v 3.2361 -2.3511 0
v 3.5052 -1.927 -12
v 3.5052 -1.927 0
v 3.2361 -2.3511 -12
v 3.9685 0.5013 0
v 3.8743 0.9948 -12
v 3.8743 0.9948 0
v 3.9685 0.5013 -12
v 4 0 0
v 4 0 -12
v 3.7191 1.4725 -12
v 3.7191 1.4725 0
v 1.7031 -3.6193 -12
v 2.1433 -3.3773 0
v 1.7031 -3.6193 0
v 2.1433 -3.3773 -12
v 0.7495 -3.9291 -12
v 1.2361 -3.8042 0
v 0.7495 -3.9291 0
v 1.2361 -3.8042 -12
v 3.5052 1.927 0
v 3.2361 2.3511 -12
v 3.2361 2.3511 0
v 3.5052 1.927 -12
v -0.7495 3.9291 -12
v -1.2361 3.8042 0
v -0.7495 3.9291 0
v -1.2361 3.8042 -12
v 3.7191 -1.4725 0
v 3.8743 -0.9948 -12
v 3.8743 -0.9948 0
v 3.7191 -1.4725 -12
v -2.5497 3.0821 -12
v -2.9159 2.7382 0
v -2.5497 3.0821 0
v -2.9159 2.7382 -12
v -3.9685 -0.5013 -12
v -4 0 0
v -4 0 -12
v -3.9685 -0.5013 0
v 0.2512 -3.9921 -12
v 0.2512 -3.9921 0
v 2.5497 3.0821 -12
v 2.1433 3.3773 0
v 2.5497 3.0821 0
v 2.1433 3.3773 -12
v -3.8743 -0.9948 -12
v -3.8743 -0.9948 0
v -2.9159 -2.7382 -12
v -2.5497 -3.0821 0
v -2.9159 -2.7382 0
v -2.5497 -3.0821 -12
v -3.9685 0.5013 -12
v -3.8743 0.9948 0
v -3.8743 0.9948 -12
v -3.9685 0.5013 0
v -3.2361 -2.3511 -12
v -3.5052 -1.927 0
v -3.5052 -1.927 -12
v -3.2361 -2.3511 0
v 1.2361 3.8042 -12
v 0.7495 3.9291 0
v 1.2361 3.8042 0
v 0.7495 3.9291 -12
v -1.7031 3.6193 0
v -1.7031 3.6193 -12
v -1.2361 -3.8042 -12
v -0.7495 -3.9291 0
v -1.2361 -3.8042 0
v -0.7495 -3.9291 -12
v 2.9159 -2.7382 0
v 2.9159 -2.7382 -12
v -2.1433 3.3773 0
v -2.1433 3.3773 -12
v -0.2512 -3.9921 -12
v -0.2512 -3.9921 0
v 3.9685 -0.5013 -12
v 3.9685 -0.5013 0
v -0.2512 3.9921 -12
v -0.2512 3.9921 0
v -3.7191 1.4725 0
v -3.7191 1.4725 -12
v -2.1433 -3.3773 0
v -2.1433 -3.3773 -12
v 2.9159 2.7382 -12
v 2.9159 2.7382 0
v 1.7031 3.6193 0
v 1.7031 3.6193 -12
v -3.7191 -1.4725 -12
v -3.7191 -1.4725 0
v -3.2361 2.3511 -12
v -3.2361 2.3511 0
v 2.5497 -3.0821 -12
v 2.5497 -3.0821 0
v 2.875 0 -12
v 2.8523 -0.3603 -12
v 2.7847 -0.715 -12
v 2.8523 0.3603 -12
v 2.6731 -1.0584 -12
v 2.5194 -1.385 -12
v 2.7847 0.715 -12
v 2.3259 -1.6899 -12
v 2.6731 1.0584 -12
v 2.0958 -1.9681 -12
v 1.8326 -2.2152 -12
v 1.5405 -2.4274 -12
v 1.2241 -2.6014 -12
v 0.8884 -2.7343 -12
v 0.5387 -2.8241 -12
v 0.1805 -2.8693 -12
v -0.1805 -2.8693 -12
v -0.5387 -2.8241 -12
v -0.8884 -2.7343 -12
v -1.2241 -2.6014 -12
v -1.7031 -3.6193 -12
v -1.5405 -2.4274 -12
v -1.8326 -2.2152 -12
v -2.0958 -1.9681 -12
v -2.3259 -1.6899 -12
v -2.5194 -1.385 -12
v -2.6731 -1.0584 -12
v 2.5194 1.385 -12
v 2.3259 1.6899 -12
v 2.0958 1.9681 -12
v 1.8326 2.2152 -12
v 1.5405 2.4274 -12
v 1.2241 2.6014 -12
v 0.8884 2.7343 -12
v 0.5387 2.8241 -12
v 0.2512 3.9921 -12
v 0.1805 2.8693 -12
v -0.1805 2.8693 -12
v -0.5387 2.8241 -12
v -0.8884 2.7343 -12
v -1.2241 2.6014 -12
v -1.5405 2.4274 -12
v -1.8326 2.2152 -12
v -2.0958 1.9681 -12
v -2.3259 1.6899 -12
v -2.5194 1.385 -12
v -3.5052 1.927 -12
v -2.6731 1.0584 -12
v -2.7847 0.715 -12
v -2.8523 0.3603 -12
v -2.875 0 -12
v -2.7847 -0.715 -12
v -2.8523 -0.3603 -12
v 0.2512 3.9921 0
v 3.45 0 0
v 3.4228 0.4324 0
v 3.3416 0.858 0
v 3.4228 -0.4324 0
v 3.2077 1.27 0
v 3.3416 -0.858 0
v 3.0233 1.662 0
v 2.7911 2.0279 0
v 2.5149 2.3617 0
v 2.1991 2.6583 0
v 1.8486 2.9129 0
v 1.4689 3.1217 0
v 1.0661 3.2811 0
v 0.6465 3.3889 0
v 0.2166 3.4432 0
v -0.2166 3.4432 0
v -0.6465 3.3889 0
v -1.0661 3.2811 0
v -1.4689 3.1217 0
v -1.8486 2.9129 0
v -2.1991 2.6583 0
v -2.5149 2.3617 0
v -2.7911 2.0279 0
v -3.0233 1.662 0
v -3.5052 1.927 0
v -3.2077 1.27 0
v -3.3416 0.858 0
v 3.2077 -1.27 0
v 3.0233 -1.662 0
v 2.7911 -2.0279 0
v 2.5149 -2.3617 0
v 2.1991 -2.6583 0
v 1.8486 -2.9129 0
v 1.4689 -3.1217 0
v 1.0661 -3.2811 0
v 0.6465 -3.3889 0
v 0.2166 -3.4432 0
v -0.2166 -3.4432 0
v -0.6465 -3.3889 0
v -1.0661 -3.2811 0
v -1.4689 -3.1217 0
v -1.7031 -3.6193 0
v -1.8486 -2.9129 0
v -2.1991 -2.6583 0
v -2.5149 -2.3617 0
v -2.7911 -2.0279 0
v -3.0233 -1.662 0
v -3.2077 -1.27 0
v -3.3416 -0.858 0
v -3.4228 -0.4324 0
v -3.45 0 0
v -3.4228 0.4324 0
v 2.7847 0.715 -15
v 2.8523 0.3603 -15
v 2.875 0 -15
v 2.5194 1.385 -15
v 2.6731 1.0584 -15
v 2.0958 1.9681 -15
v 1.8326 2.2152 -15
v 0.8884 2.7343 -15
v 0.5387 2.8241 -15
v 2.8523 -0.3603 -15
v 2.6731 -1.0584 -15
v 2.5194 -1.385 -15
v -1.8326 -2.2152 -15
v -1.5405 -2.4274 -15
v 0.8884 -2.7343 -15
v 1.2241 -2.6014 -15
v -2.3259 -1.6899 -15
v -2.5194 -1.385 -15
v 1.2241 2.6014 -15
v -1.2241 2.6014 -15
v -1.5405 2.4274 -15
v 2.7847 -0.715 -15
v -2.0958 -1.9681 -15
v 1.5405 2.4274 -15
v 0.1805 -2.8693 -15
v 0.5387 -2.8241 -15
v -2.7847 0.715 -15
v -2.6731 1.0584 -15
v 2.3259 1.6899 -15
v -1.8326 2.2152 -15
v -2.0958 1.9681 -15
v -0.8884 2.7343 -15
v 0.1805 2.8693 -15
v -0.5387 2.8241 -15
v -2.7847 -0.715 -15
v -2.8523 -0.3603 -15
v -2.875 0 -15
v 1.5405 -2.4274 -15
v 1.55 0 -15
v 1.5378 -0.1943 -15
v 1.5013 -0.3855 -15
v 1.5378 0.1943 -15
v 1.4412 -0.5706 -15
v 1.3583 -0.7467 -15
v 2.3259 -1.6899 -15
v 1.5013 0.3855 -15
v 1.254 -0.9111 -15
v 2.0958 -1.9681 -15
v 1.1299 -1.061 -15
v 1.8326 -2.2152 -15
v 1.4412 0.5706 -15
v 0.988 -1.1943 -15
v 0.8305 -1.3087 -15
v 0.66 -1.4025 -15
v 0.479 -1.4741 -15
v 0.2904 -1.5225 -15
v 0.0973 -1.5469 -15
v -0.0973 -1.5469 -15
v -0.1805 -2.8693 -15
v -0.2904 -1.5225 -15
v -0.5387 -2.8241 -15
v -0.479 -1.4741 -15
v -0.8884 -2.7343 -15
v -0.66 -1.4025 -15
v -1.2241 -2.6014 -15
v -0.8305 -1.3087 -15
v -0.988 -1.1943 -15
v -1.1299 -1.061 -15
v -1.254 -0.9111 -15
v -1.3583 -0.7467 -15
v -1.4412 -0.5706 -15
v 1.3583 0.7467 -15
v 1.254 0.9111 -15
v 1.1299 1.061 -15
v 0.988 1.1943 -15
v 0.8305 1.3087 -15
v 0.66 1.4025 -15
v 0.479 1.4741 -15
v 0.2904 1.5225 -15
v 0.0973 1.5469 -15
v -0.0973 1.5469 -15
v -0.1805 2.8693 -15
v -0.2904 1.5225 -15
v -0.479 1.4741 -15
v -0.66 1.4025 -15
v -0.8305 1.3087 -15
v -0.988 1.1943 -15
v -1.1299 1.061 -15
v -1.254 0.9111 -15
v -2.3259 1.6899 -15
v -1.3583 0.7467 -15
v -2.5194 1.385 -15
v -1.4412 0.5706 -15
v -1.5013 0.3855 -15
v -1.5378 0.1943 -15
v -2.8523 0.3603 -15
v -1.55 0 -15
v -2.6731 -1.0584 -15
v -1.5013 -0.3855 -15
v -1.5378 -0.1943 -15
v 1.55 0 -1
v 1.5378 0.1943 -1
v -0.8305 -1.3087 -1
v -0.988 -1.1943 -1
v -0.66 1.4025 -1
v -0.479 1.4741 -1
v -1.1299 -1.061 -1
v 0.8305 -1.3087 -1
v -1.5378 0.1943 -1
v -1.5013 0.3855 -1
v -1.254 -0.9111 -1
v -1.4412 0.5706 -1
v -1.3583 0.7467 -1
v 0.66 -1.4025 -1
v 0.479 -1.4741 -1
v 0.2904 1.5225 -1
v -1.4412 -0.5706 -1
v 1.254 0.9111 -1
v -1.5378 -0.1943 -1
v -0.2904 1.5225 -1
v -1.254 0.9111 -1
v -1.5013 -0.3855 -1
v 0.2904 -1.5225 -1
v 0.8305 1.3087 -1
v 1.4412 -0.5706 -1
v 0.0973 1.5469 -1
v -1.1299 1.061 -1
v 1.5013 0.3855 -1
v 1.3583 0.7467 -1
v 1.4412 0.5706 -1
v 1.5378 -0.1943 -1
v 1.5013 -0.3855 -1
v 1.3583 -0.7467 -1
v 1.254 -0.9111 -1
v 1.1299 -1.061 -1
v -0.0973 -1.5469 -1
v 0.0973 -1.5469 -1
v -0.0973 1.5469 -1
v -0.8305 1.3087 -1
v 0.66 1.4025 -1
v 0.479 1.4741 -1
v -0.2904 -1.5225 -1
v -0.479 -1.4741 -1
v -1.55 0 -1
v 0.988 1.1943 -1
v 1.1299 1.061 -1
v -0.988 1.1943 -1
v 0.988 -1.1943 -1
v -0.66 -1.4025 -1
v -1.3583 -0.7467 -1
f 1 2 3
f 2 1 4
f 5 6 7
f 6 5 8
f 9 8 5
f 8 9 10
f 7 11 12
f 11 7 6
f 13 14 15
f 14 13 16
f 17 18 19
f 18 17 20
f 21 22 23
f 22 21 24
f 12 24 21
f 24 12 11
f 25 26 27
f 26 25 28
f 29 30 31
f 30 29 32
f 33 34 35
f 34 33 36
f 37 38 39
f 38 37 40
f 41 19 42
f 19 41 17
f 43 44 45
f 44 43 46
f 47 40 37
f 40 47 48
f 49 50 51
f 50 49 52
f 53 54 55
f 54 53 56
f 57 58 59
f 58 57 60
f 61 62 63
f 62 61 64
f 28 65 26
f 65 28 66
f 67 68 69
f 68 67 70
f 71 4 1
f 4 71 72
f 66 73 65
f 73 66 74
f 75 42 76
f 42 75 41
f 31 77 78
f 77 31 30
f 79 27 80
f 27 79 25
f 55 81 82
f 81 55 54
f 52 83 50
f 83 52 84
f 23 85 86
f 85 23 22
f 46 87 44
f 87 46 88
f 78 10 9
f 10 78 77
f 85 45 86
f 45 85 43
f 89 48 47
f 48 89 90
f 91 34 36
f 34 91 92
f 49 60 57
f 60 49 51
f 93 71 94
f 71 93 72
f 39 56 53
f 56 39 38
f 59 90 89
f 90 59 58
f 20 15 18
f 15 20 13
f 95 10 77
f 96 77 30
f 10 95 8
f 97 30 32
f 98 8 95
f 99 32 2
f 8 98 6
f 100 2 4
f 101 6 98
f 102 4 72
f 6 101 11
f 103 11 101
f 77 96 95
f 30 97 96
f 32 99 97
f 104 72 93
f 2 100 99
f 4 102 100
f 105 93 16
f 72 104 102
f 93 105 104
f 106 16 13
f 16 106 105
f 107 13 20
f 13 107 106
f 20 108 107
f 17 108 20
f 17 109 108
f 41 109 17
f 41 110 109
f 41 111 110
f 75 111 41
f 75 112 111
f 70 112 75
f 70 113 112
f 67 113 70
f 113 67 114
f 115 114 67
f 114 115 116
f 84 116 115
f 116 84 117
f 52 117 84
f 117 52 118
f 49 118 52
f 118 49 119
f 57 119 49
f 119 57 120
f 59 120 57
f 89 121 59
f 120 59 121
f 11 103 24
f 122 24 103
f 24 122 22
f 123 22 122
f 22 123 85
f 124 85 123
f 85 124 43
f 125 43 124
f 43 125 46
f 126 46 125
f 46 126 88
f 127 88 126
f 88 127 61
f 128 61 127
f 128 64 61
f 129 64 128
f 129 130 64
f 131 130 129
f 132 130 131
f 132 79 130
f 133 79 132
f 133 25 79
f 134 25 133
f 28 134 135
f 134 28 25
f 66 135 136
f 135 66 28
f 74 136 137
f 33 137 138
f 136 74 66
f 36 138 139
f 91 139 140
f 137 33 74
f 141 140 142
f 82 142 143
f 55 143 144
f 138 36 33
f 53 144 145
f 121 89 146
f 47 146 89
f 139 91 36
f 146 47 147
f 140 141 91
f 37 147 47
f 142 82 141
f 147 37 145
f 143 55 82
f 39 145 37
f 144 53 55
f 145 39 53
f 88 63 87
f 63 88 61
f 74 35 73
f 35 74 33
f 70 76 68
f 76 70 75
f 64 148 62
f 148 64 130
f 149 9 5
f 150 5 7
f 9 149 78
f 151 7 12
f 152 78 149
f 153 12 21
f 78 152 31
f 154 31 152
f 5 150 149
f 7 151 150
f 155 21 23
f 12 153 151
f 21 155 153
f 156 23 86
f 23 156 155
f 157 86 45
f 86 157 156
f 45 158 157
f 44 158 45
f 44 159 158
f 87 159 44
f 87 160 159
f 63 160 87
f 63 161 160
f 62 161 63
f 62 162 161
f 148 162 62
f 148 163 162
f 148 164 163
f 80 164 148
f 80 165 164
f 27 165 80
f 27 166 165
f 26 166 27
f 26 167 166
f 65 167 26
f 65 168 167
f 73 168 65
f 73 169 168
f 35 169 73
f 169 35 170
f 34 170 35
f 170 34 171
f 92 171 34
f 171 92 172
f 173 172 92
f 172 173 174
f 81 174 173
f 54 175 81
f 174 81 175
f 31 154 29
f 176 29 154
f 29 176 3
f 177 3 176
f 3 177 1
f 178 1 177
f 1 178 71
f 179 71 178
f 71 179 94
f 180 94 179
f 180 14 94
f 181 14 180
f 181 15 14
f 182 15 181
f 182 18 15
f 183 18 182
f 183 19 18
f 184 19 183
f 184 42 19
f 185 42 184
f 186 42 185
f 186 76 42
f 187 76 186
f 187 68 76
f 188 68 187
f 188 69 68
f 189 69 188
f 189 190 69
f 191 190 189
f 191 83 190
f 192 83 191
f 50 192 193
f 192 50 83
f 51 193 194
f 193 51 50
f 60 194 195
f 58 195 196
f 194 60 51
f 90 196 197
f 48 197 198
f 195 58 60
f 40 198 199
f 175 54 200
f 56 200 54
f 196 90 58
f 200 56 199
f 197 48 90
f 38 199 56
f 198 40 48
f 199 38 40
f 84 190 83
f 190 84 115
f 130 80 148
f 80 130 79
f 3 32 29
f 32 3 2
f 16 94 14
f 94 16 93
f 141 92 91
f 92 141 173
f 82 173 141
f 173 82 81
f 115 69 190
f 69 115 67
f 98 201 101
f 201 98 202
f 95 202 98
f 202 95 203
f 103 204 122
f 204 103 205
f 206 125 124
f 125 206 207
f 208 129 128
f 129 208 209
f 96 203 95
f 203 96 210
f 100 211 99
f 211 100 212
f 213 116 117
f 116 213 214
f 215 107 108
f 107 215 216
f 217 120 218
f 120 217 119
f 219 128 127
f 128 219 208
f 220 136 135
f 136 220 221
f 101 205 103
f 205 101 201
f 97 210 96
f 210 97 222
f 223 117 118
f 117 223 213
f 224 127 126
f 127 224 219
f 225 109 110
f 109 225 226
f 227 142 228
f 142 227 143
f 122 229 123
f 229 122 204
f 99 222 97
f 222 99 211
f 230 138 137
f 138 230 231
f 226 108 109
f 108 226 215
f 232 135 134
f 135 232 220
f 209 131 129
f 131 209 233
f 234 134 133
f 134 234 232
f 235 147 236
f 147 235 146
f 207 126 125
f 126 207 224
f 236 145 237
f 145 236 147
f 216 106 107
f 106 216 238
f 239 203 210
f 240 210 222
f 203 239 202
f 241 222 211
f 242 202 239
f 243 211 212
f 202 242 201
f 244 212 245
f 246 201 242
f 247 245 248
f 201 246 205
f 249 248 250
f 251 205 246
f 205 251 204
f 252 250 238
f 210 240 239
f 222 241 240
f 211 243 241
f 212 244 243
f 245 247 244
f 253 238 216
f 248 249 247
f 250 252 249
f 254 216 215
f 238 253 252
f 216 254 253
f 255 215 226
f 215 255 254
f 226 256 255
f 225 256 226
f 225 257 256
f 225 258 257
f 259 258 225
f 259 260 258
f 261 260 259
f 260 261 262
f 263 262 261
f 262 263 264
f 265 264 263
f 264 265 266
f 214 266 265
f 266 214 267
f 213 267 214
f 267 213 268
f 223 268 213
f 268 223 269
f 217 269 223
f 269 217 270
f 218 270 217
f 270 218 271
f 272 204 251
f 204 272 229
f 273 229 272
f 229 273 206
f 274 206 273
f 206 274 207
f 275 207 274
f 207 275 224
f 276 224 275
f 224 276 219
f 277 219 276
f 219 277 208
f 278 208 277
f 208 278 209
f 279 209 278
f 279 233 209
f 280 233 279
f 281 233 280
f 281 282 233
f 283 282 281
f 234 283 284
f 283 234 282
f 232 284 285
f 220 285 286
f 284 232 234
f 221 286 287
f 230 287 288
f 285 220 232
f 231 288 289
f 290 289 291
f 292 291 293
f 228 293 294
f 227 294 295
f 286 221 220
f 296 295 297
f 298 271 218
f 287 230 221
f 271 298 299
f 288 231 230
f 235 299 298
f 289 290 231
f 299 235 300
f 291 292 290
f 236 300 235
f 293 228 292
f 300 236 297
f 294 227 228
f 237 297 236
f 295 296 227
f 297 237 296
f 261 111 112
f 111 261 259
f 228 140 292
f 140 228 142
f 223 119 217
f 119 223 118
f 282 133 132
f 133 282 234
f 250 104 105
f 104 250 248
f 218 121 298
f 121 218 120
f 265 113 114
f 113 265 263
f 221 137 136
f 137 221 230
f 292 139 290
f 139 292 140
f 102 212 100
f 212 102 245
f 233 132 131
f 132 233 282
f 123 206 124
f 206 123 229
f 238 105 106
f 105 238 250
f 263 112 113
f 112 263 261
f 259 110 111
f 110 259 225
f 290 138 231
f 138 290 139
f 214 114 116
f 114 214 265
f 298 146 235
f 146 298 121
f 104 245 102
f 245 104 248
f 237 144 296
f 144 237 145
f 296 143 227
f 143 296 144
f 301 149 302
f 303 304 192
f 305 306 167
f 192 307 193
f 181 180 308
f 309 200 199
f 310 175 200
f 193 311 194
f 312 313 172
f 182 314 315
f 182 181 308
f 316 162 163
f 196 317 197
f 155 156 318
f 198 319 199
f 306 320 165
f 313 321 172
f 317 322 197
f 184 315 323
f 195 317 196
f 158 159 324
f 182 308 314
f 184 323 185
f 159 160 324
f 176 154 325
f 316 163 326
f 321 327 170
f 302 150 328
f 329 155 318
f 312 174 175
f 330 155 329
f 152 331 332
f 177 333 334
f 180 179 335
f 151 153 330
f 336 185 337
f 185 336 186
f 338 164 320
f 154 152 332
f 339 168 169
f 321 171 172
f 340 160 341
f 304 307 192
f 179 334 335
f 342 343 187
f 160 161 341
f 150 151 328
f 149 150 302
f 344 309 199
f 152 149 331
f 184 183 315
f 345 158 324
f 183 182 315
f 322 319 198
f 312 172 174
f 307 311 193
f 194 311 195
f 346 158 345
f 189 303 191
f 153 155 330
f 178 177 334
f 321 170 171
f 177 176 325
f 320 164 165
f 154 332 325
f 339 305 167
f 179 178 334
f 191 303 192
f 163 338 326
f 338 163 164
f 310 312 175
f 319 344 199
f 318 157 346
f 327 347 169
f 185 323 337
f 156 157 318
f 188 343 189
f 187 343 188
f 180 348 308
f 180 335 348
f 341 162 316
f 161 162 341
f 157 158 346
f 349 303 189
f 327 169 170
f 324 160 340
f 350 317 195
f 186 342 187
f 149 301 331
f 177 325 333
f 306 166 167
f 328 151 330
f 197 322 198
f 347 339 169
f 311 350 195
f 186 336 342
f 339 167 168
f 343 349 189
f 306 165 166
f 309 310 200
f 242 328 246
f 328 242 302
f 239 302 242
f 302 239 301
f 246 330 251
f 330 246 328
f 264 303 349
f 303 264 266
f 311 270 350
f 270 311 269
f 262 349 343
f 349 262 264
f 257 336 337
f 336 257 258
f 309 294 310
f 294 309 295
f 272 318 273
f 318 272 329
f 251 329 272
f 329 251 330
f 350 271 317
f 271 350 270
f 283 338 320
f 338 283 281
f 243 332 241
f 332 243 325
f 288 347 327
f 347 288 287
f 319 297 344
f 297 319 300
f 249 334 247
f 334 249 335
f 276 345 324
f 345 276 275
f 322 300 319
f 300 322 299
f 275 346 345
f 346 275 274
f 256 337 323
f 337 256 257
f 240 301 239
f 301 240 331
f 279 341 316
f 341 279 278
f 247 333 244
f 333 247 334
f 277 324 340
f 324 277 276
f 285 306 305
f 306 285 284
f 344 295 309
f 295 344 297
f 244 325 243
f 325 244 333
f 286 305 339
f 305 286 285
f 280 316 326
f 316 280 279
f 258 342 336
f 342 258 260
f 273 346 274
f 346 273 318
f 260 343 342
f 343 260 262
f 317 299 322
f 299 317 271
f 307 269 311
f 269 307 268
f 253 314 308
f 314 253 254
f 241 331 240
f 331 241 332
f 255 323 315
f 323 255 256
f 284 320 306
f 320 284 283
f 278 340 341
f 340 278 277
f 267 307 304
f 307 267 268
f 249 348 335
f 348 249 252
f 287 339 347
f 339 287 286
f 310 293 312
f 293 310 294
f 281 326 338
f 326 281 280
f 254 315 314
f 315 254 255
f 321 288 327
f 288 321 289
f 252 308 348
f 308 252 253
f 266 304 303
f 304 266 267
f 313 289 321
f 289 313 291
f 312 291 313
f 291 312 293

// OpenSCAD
$fn = 50;

difference() {
	union() {
		translate(v = [0, 0, -12.0]) {
			cylinder(h = 12, r = 4.0);
		}
		#translate(v = [0, 0, -15.0]) {
			cylinder(h = 15, r = 2.875);
		}
	}
	union() {
		translate(v = [0, 0, 0]) {
			rotate(a = [0, 0, 0]) {
				difference() {
					union() {
						translate(v = [0, 0, -15.0]) {
							cylinder(h = 15, r = 1.25);
						}
						translate(v = [0, 0, -1.0]) {
							cylinder(h = 1.0, r1 = 1.55, r2 = 3.45);
						}
						translate(v = [0, 0, -15.0]) {
							cylinder(h = 15, r = 1.55);
						}
						translate(v = [0, 0, -15.0]) {
							cylinder(h = 15, r = 1.25);
						}
					}
					union();
				}
			}
		}
	}
}
